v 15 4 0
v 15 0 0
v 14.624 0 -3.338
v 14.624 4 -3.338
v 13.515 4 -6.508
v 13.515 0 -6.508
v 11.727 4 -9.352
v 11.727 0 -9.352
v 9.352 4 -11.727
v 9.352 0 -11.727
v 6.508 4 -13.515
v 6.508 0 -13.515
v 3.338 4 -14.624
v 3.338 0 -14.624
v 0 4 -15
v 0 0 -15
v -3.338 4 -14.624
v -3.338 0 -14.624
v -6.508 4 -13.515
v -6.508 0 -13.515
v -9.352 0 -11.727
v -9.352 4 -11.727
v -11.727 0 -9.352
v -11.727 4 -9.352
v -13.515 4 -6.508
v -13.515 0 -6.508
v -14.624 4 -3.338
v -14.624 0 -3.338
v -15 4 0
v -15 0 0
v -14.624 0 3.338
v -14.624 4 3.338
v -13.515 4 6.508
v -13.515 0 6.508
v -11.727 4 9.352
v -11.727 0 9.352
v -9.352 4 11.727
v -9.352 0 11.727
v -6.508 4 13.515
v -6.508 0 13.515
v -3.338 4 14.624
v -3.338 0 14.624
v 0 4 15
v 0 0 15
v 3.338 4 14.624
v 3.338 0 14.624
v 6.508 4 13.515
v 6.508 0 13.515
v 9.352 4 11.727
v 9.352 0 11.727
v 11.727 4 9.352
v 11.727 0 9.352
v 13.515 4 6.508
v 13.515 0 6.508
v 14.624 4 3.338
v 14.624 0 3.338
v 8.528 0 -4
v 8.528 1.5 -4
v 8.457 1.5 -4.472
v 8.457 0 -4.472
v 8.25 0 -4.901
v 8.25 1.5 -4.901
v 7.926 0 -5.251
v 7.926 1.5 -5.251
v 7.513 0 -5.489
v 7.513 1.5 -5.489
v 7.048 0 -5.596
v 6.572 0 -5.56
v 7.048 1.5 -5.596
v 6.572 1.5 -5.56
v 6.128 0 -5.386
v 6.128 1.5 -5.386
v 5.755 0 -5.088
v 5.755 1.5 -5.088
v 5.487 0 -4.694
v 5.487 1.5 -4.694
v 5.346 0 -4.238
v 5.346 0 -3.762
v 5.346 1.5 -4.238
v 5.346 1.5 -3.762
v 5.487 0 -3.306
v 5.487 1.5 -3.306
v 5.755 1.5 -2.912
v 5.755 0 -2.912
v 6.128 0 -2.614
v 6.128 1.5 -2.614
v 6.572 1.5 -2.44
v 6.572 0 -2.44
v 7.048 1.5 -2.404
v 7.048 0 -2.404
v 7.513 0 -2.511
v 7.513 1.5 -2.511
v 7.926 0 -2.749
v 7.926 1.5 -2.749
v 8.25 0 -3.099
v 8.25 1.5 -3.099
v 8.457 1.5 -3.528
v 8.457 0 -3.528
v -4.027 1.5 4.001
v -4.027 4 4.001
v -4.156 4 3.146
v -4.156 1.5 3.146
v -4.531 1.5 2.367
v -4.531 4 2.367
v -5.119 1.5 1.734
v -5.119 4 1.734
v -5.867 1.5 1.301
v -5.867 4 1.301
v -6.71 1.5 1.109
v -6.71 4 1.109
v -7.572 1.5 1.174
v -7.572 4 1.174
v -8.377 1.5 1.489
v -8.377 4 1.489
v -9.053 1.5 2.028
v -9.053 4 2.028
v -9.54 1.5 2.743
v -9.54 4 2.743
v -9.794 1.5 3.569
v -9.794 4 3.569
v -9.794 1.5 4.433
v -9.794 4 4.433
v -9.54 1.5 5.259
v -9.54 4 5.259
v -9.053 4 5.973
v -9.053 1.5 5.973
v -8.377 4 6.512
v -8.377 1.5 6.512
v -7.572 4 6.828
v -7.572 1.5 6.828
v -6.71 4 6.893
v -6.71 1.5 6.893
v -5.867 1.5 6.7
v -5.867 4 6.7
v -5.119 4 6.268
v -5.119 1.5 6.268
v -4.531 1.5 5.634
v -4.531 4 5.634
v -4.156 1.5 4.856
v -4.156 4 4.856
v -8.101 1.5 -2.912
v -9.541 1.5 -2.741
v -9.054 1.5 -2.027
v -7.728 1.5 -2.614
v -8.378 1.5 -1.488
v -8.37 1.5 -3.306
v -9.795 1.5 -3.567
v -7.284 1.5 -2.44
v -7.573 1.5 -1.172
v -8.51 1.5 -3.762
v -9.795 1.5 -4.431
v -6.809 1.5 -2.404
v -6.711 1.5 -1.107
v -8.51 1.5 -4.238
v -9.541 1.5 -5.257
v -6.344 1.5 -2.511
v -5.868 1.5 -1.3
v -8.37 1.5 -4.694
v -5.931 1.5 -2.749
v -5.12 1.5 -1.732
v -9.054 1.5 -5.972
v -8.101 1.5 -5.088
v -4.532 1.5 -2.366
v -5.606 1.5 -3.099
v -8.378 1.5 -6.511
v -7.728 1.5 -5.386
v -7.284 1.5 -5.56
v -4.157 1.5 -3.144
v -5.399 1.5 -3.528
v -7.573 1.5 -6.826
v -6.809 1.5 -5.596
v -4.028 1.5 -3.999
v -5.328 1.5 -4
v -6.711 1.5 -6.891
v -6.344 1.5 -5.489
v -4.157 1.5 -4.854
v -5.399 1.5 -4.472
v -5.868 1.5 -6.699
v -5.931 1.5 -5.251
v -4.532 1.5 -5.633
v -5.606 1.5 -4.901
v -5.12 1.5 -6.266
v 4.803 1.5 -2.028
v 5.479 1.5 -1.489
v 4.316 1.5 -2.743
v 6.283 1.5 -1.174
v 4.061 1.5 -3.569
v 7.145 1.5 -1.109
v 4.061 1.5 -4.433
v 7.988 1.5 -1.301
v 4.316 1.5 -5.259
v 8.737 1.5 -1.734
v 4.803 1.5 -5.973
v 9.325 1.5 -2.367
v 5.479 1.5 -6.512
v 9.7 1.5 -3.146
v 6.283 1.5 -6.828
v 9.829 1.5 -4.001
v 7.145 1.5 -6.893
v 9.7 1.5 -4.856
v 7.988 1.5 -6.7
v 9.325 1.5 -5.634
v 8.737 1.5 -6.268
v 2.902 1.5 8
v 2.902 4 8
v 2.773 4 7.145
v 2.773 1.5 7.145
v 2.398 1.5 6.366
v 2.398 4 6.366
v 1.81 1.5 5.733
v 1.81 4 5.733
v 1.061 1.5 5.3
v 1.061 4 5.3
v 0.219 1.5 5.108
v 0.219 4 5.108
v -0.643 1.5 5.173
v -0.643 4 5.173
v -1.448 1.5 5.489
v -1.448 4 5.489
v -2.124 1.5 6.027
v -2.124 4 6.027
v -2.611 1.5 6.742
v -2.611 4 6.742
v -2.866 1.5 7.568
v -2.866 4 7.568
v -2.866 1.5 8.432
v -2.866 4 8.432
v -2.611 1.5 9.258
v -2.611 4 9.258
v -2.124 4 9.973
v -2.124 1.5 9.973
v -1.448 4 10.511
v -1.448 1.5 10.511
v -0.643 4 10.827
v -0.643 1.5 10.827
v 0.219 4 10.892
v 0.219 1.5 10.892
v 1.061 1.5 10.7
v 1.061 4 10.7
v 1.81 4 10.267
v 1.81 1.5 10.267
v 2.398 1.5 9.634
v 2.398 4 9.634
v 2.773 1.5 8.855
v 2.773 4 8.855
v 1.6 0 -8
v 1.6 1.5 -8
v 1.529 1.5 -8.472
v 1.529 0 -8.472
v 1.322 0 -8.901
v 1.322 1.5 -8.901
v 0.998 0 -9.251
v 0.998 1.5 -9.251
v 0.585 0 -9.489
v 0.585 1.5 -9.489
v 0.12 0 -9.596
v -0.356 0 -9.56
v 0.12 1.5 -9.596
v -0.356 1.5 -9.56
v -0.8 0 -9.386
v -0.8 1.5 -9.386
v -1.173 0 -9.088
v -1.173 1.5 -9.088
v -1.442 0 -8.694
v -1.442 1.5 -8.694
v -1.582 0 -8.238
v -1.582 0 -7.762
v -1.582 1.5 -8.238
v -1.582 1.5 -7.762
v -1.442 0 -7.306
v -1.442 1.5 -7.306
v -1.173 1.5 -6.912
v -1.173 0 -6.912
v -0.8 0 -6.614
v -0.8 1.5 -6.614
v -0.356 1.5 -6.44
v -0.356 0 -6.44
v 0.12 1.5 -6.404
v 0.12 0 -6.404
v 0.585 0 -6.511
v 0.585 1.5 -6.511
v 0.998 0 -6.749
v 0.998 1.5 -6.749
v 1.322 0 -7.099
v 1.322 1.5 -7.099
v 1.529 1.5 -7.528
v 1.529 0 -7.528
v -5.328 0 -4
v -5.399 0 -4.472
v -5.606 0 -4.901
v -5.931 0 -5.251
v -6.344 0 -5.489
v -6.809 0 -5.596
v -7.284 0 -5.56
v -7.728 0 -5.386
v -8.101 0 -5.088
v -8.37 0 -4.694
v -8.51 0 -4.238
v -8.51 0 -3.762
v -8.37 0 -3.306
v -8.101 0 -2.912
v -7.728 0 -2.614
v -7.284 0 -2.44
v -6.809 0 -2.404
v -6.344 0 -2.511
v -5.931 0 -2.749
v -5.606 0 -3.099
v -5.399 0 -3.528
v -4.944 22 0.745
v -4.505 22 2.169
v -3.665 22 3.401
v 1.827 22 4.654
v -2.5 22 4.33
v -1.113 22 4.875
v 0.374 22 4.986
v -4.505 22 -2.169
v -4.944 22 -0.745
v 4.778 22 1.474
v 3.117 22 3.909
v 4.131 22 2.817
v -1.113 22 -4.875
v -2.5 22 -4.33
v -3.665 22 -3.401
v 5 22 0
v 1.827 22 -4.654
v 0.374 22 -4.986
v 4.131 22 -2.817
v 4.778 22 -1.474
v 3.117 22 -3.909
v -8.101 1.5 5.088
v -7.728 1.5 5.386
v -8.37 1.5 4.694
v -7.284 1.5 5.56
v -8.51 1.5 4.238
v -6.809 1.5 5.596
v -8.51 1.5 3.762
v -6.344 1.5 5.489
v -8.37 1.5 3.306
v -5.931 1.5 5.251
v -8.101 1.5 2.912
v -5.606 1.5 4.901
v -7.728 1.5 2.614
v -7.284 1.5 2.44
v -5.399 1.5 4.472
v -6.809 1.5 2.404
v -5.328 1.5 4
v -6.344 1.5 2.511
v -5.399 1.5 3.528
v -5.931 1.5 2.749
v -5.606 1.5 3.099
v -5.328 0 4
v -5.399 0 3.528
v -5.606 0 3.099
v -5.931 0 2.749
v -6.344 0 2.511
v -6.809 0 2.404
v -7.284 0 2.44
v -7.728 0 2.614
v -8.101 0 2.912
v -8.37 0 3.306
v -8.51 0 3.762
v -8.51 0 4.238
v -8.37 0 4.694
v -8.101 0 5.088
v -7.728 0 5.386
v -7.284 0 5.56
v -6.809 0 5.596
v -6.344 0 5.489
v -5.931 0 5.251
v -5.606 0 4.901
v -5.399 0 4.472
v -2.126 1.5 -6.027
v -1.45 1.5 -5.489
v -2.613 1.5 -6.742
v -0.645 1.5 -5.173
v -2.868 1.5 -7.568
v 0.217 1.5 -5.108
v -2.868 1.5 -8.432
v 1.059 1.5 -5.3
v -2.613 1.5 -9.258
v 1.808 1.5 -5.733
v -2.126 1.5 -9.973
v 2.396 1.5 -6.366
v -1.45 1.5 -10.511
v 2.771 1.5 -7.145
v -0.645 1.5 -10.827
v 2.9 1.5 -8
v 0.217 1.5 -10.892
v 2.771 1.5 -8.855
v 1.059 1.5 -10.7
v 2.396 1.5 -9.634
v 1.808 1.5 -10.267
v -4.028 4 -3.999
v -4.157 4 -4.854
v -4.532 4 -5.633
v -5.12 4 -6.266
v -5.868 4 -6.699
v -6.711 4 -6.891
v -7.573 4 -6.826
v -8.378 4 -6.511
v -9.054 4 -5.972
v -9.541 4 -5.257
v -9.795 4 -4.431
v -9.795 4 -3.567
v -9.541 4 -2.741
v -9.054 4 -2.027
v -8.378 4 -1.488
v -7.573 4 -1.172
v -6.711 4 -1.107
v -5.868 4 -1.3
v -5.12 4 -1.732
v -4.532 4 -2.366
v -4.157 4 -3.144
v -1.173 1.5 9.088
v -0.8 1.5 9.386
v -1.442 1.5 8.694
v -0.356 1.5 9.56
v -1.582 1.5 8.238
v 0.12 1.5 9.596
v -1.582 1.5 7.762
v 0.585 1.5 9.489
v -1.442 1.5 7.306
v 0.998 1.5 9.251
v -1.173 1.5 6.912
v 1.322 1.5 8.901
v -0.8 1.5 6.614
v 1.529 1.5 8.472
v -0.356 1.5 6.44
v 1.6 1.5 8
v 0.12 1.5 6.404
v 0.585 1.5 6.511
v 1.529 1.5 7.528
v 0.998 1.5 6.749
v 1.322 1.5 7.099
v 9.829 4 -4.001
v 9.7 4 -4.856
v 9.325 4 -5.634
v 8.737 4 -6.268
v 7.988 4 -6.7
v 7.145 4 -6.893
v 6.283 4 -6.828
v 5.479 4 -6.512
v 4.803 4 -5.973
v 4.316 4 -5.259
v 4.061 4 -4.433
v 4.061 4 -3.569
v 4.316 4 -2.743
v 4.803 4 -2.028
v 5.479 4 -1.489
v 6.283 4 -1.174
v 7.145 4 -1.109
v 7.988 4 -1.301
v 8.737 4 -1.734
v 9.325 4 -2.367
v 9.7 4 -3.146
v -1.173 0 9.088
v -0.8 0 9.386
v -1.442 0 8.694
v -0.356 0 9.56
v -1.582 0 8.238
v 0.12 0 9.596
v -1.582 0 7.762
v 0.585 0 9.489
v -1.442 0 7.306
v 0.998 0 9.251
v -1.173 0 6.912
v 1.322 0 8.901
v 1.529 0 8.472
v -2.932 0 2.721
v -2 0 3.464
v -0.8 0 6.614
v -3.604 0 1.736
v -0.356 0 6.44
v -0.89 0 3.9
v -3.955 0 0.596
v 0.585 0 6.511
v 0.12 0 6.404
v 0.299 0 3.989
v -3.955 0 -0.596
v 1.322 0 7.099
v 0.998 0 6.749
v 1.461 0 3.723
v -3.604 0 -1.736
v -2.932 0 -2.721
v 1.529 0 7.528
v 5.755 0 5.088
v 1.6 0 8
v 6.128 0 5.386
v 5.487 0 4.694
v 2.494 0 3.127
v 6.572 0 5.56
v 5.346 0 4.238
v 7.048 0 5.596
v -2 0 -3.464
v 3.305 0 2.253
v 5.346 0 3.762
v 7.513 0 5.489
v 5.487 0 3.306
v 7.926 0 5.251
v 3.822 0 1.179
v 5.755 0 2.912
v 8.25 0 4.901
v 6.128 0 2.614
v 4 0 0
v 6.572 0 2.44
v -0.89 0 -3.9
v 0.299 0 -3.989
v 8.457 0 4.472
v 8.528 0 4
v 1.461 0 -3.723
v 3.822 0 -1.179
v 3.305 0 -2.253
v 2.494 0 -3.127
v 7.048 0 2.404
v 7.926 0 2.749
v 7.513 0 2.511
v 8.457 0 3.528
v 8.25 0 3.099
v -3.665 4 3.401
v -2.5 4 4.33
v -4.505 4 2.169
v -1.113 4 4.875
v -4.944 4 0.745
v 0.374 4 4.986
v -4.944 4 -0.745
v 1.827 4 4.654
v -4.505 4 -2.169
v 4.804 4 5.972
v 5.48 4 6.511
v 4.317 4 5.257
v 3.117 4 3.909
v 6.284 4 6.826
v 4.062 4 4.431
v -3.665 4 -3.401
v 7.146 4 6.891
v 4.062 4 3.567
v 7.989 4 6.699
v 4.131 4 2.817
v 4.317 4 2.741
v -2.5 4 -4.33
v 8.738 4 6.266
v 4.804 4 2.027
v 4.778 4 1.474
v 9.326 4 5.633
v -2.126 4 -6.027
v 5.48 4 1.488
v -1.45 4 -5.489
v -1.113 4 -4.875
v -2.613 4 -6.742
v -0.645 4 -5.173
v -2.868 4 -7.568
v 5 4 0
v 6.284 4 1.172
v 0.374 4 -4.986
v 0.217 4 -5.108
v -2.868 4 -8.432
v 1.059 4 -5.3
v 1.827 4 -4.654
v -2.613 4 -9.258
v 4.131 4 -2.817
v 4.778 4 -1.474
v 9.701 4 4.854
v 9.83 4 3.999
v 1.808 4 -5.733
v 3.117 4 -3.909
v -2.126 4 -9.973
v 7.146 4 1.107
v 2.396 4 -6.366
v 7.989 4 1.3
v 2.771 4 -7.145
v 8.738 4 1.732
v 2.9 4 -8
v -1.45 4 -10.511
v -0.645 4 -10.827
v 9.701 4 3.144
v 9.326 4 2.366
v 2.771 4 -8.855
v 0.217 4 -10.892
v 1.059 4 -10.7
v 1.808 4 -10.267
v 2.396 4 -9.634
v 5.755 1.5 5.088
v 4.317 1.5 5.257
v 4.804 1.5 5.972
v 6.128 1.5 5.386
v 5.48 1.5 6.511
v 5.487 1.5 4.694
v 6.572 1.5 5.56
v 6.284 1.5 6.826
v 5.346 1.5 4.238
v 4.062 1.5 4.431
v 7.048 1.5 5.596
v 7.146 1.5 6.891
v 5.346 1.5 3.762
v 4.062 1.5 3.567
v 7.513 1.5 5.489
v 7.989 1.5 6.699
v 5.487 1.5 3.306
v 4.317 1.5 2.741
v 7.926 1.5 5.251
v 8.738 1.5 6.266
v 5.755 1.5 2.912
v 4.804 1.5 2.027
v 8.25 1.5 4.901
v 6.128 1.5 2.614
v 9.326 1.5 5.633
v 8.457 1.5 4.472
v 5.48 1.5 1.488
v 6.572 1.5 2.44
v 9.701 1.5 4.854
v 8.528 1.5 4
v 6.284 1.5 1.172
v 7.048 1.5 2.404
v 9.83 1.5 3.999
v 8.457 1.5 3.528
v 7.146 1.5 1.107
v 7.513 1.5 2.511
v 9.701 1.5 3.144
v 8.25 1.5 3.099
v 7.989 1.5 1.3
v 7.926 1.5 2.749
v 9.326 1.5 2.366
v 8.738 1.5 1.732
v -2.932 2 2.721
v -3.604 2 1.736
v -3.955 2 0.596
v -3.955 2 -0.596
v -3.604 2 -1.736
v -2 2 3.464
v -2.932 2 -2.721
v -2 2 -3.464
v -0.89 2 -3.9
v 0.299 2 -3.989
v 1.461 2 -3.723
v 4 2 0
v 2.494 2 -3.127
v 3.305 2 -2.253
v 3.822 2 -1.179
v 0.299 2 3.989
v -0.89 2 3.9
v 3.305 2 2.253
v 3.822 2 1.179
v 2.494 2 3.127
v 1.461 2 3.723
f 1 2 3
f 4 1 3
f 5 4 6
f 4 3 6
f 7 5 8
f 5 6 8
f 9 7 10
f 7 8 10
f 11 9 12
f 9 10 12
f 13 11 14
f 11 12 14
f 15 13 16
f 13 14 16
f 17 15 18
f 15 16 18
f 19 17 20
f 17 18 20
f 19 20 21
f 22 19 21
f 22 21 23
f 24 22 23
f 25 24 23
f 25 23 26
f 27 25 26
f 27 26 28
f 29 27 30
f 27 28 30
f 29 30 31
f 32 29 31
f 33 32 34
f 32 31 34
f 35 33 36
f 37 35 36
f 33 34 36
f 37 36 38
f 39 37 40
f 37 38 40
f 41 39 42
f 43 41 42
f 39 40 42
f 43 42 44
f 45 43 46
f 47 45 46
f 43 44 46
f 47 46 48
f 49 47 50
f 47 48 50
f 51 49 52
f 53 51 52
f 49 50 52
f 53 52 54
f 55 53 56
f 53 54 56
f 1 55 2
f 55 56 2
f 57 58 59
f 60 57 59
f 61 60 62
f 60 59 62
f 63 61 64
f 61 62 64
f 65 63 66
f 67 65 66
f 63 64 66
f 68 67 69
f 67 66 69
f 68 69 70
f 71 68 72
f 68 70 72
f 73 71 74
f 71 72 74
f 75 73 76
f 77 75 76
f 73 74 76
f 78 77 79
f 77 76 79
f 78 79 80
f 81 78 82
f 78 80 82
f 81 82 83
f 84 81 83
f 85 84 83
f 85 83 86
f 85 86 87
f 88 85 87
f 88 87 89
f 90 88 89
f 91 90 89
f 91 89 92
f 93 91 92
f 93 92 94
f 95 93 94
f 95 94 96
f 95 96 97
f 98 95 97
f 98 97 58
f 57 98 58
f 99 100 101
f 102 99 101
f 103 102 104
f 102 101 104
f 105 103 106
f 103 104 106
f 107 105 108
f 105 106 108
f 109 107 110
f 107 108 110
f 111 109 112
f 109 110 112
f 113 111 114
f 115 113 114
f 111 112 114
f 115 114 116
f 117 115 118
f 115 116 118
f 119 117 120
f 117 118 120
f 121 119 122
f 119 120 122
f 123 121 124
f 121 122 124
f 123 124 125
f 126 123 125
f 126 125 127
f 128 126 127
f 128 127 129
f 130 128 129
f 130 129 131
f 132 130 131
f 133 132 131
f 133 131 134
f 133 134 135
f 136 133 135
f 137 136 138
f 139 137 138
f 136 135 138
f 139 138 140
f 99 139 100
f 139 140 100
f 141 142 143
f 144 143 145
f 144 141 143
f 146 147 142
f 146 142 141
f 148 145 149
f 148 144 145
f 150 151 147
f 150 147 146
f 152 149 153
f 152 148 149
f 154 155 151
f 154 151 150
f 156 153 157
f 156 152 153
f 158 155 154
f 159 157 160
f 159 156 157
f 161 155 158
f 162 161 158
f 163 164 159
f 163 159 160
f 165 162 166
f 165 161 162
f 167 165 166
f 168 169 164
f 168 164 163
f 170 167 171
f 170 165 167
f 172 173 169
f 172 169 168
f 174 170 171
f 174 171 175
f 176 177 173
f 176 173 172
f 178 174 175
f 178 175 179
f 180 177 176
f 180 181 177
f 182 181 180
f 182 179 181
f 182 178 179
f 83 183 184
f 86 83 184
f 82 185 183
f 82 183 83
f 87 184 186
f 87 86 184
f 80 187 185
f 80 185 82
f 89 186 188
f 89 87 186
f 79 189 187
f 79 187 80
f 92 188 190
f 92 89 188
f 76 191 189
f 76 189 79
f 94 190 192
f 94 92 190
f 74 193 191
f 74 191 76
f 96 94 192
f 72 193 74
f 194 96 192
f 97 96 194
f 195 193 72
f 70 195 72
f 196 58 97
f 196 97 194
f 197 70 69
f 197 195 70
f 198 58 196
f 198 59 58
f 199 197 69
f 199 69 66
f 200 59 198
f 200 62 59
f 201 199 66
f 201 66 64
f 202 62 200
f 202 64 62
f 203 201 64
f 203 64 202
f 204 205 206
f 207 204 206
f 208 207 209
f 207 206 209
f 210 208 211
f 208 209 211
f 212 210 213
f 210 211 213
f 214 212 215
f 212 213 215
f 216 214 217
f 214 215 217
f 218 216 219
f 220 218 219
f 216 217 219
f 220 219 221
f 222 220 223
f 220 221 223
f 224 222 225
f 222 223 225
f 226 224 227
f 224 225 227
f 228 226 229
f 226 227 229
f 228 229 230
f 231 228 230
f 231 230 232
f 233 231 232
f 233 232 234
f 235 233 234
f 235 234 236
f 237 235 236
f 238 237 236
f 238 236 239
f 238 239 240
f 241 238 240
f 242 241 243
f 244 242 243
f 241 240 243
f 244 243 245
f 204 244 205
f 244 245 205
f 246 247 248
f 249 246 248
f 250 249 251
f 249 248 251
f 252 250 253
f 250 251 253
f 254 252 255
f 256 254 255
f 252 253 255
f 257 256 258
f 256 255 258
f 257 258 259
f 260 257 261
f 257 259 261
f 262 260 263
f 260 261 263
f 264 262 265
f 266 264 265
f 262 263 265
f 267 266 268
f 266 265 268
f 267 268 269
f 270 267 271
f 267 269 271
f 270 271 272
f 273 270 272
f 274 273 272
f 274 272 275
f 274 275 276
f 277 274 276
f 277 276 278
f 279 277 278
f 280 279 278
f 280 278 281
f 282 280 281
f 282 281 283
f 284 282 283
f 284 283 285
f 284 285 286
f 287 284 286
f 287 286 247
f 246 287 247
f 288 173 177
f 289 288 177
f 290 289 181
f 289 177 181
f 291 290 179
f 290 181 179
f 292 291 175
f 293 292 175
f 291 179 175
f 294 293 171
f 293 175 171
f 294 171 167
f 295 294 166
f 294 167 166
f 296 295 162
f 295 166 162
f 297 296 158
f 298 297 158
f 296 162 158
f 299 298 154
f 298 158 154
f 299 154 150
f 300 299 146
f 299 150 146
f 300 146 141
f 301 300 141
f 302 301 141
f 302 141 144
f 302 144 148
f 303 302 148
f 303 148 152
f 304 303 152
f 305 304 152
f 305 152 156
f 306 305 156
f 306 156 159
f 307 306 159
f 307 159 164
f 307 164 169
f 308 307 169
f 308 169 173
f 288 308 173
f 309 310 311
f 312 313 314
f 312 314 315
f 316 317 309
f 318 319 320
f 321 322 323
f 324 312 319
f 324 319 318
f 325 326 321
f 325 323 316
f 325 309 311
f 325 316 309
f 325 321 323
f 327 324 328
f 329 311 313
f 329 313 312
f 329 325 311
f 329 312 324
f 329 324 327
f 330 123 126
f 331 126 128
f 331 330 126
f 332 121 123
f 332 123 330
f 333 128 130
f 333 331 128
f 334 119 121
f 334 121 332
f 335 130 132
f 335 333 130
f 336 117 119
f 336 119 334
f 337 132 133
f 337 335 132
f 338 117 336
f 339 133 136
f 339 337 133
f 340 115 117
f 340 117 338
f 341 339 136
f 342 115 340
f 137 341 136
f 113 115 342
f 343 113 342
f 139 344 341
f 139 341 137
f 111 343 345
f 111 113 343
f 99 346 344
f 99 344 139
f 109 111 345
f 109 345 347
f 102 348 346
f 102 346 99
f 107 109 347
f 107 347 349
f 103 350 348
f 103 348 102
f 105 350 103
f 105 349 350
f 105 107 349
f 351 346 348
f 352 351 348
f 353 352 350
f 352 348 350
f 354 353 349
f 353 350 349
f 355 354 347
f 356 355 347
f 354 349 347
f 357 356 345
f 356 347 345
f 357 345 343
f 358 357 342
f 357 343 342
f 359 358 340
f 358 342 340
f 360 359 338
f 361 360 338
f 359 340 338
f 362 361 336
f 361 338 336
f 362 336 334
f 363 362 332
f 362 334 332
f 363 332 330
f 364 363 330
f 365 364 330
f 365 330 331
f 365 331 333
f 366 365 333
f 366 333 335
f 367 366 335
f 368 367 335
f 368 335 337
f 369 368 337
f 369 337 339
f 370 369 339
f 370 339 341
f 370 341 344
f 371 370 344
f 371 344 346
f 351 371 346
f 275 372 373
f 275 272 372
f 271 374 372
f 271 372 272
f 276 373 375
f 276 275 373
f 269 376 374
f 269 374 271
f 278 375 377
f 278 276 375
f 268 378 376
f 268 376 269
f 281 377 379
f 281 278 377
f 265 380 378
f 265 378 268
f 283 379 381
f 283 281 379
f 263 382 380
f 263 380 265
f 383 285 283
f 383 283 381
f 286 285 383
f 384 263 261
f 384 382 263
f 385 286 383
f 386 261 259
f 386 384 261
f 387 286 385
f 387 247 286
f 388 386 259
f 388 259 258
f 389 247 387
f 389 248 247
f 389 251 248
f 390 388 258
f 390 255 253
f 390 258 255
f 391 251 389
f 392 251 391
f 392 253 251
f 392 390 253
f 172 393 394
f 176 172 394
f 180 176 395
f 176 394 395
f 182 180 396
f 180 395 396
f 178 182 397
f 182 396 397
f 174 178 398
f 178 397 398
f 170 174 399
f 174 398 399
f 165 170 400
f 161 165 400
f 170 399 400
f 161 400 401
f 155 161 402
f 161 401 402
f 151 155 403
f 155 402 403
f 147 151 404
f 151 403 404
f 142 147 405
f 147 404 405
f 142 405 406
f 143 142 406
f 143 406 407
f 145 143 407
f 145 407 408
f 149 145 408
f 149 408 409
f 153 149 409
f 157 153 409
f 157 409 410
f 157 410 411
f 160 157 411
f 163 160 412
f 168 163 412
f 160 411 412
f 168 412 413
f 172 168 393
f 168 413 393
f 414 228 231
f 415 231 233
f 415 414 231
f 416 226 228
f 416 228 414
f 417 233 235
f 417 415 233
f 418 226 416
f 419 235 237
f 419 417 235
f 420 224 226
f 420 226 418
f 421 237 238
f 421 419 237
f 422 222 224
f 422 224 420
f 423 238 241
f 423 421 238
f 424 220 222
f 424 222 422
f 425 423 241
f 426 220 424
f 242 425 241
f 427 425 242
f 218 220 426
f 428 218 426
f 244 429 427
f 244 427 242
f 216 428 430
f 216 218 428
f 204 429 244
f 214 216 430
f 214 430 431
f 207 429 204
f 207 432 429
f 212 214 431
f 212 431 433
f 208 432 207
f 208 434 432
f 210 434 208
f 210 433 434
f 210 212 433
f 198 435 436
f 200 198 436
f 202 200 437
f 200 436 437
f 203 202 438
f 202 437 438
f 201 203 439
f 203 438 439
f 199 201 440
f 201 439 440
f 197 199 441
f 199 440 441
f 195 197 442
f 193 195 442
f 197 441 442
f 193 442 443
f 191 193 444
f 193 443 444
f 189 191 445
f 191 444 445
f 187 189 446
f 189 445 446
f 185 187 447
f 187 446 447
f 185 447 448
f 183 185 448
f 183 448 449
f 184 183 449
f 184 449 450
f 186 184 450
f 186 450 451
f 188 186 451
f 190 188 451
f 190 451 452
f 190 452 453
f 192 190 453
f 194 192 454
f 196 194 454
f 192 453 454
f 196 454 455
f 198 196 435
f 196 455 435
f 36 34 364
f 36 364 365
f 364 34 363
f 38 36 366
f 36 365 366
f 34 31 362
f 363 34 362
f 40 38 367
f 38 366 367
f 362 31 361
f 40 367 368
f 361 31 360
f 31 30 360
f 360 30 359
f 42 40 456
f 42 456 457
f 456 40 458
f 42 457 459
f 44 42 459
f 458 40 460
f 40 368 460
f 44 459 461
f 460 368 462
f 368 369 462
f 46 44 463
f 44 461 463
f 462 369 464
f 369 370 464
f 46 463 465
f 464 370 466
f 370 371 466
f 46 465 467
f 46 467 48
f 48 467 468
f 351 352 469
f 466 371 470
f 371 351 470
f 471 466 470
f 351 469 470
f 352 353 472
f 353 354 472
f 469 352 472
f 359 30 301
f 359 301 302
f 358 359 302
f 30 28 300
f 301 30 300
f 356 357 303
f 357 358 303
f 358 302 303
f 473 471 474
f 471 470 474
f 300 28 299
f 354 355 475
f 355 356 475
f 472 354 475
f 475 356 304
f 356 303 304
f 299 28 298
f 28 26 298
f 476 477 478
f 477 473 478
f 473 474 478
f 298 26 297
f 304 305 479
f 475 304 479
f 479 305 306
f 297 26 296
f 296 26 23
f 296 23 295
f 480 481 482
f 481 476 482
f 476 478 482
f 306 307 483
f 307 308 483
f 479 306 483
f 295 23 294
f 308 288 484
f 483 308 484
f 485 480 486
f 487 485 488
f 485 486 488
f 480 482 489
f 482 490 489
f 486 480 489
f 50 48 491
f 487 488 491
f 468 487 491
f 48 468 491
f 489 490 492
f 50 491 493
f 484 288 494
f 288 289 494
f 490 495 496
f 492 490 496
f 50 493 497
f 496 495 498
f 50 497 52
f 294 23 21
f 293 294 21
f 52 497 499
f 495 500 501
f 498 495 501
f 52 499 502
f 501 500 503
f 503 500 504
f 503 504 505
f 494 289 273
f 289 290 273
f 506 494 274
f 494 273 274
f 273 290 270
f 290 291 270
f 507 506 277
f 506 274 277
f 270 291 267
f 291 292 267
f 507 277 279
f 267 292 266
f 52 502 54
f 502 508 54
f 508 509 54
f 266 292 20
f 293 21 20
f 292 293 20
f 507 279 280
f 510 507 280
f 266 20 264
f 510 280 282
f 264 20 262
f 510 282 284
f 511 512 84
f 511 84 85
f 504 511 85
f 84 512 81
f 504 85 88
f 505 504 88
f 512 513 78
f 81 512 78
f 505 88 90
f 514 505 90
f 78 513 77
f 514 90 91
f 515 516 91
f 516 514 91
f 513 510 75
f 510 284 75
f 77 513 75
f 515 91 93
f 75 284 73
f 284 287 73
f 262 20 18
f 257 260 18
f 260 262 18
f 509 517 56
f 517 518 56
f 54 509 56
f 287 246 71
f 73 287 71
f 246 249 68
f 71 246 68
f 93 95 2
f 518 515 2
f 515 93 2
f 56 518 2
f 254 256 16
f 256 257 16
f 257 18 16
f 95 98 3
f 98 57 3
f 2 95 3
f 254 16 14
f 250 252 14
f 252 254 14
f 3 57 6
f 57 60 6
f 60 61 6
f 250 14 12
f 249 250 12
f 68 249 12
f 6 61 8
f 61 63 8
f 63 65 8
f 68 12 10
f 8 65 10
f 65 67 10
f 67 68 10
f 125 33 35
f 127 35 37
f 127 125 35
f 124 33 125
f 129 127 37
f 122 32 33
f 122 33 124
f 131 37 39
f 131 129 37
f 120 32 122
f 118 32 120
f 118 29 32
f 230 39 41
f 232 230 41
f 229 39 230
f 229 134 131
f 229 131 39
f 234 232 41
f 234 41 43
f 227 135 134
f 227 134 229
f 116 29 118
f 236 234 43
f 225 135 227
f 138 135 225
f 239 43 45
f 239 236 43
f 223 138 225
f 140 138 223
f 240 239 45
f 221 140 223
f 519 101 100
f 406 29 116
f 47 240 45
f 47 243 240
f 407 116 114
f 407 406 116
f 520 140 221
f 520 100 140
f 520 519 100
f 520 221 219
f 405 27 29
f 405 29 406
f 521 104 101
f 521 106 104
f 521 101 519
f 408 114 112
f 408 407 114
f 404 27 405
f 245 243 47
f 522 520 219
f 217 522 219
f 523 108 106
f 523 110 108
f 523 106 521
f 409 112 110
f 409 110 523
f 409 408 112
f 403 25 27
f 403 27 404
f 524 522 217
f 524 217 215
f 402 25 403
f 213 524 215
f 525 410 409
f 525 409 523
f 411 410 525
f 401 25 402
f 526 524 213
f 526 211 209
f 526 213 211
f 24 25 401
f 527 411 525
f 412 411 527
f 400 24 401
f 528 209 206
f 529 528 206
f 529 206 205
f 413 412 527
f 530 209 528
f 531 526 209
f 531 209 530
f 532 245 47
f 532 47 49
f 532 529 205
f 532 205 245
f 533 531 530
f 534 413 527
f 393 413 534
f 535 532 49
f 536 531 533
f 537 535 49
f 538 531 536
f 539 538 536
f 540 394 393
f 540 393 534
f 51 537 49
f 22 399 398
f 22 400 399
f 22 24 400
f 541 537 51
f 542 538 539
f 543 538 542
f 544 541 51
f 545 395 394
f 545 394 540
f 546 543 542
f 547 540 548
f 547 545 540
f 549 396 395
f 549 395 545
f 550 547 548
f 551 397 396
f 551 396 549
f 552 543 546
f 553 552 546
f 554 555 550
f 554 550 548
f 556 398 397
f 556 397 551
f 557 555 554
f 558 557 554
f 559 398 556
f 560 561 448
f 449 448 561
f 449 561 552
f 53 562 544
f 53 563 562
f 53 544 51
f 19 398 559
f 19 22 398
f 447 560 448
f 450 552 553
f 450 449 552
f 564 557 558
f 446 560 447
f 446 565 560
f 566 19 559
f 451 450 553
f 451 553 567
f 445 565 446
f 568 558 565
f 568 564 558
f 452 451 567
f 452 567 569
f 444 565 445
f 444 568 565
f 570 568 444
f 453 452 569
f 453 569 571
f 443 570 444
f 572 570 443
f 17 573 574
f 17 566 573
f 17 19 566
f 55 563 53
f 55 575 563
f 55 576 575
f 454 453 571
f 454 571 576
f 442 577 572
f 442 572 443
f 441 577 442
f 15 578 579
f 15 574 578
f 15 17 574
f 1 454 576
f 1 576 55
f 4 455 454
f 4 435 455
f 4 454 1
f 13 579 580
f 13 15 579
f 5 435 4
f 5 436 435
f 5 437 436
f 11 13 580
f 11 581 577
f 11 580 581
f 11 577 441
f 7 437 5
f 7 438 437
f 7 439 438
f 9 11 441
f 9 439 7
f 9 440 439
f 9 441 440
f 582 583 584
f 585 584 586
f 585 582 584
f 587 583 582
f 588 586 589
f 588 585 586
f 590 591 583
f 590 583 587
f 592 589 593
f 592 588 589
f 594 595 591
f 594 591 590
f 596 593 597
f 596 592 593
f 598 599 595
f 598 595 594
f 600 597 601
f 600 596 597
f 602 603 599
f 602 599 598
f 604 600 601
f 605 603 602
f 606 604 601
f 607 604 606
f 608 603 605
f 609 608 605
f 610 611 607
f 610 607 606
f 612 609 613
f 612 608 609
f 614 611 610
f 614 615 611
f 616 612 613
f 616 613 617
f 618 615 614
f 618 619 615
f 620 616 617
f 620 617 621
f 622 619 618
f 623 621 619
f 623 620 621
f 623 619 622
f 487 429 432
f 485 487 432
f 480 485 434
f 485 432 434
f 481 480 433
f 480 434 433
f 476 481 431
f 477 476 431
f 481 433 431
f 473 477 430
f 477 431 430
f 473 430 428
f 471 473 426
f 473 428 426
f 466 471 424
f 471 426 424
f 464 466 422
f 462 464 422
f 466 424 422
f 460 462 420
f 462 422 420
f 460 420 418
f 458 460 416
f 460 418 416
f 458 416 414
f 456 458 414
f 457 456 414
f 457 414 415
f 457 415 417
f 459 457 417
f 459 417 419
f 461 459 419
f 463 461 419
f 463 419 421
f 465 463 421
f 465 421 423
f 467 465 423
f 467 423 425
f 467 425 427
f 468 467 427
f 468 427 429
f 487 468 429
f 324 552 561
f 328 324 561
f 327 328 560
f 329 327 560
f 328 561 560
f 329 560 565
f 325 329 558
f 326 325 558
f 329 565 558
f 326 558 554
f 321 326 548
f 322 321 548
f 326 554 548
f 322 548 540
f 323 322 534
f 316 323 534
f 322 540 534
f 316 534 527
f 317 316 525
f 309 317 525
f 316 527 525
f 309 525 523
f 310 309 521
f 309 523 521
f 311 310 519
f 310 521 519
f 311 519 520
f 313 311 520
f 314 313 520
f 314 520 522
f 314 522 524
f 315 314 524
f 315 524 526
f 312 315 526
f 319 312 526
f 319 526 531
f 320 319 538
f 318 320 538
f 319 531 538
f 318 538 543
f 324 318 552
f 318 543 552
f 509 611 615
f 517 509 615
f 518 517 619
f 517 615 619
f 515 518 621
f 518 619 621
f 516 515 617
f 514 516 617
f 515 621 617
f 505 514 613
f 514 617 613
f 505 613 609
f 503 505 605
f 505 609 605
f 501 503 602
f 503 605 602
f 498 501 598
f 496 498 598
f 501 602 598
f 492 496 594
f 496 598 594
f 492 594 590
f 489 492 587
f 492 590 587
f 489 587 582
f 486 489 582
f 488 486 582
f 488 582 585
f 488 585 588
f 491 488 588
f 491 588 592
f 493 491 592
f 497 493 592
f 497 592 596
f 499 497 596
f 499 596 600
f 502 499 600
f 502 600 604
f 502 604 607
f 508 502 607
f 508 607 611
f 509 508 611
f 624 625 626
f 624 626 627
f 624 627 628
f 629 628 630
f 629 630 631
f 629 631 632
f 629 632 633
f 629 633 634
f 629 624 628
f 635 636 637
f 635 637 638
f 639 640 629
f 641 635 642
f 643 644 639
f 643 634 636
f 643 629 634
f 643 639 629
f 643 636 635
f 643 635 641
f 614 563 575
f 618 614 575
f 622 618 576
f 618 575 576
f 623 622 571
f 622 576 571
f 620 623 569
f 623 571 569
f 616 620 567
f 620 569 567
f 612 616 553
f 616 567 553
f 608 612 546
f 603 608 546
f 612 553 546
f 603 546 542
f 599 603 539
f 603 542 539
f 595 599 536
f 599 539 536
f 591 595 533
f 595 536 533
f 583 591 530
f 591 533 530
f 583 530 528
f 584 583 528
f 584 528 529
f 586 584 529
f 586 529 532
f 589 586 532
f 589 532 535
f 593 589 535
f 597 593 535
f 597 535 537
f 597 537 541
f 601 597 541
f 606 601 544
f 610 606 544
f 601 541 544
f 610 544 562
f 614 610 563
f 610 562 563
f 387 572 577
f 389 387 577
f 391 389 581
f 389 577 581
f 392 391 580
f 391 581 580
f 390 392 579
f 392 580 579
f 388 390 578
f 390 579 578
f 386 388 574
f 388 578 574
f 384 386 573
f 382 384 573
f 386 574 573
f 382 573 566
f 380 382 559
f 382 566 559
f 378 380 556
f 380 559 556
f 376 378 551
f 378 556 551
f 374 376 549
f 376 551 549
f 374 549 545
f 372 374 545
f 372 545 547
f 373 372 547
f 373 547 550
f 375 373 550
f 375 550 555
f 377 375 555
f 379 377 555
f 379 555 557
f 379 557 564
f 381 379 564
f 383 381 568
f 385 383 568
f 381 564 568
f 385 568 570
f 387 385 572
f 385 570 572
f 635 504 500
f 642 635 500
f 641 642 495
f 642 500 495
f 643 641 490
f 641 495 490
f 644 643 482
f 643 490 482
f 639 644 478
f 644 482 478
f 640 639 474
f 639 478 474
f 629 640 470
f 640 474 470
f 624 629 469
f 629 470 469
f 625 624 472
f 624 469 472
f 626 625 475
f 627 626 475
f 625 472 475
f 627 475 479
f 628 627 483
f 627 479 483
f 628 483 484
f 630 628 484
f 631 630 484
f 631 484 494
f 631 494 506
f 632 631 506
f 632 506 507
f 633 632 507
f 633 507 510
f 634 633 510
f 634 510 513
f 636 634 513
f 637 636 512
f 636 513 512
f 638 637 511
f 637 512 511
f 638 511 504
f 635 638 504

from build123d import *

# Parameters (mm, degrees)
SKETCH_1_R          = 15
EXTRUDE_1_DEPTH     = 4
SKETCH_2_R          = 1.6
CUT_EXTRUDE_1_DEPTH = 5
SKETCH_3_R          = 2.9
CUT_EXTRUDE_2_DEPTH = 2.5
SKETCH_4_R          = 5
EXTRUDE_2_DEPTH     = 18
SKETCH_5_R          = 4
CUT_EXTRUDE_3_DEPTH = 2


with BuildPart() as part:
    # 草图1 → 凸台-拉伸1 (new body)
    with BuildSketch(Plane(origin=(0, 0, 0), x_dir=(1, 0, 0), z_dir=(0, 1, 0))):
        Circle(SKETCH_1_R)
    extrude(amount=EXTRUDE_1_DEPTH)

    # 草图2 → 切除-拉伸1 (cut)
    with BuildSketch(Plane(origin=(0, 4, 0), x_dir=(1, 0, 0), z_dir=(0, 1, 0))):
        with Locations((0, 8)):
            Circle(SKETCH_2_R)
        with Locations((6.92820323, 4)):
            Circle(SKETCH_2_R)
        with Locations((6.92820323, -4)):
            Circle(SKETCH_2_R)
        with Locations((0, -8)):
            Circle(SKETCH_2_R)
        with Locations((-6.92820323, -4)):
            Circle(SKETCH_2_R)
        with Locations((-6.92820323, 4)):
            Circle(SKETCH_2_R)
    extrude(amount=-CUT_EXTRUDE_1_DEPTH, mode=Mode.SUBTRACT)

    # 草图3 → 切除-拉伸2 (cut)
    with BuildSketch(Plane(origin=(0, 4, 0), x_dir=(1, 0, 0), z_dir=(0, 1, 0))):
        with Locations((0, 8)):
            Circle(SKETCH_3_R)
        with Locations((6.92870323, 4.000866025)):
            Circle(SKETCH_3_R)
        with Locations((6.92970323, -3.999133975)):
            Circle(SKETCH_3_R)
        with Locations((0.002, -8)):
            Circle(SKETCH_3_R)
        with Locations((-6.92670323, -4.000866025)):
            Circle(SKETCH_3_R)
        with Locations((-6.92770323, 3.999133975)):
            Circle(SKETCH_3_R)
    extrude(amount=-CUT_EXTRUDE_2_DEPTH, mode=Mode.SUBTRACT)

    # 草图4 → 凸台-拉伸2 (add)
    with BuildSketch(Plane(origin=(0, 4, 0), x_dir=(1, 0, 0), z_dir=(0, 1, 0))):
        Circle(SKETCH_4_R)
    extrude(amount=EXTRUDE_2_DEPTH)

    # 草图5 → 切除-拉伸3 (cut)
    with BuildSketch(Plane.XZ):
        Circle(SKETCH_5_R)
    extrude(amount=-CUT_EXTRUDE_3_DEPTH, mode=Mode.SUBTRACT)


solid = part.part
